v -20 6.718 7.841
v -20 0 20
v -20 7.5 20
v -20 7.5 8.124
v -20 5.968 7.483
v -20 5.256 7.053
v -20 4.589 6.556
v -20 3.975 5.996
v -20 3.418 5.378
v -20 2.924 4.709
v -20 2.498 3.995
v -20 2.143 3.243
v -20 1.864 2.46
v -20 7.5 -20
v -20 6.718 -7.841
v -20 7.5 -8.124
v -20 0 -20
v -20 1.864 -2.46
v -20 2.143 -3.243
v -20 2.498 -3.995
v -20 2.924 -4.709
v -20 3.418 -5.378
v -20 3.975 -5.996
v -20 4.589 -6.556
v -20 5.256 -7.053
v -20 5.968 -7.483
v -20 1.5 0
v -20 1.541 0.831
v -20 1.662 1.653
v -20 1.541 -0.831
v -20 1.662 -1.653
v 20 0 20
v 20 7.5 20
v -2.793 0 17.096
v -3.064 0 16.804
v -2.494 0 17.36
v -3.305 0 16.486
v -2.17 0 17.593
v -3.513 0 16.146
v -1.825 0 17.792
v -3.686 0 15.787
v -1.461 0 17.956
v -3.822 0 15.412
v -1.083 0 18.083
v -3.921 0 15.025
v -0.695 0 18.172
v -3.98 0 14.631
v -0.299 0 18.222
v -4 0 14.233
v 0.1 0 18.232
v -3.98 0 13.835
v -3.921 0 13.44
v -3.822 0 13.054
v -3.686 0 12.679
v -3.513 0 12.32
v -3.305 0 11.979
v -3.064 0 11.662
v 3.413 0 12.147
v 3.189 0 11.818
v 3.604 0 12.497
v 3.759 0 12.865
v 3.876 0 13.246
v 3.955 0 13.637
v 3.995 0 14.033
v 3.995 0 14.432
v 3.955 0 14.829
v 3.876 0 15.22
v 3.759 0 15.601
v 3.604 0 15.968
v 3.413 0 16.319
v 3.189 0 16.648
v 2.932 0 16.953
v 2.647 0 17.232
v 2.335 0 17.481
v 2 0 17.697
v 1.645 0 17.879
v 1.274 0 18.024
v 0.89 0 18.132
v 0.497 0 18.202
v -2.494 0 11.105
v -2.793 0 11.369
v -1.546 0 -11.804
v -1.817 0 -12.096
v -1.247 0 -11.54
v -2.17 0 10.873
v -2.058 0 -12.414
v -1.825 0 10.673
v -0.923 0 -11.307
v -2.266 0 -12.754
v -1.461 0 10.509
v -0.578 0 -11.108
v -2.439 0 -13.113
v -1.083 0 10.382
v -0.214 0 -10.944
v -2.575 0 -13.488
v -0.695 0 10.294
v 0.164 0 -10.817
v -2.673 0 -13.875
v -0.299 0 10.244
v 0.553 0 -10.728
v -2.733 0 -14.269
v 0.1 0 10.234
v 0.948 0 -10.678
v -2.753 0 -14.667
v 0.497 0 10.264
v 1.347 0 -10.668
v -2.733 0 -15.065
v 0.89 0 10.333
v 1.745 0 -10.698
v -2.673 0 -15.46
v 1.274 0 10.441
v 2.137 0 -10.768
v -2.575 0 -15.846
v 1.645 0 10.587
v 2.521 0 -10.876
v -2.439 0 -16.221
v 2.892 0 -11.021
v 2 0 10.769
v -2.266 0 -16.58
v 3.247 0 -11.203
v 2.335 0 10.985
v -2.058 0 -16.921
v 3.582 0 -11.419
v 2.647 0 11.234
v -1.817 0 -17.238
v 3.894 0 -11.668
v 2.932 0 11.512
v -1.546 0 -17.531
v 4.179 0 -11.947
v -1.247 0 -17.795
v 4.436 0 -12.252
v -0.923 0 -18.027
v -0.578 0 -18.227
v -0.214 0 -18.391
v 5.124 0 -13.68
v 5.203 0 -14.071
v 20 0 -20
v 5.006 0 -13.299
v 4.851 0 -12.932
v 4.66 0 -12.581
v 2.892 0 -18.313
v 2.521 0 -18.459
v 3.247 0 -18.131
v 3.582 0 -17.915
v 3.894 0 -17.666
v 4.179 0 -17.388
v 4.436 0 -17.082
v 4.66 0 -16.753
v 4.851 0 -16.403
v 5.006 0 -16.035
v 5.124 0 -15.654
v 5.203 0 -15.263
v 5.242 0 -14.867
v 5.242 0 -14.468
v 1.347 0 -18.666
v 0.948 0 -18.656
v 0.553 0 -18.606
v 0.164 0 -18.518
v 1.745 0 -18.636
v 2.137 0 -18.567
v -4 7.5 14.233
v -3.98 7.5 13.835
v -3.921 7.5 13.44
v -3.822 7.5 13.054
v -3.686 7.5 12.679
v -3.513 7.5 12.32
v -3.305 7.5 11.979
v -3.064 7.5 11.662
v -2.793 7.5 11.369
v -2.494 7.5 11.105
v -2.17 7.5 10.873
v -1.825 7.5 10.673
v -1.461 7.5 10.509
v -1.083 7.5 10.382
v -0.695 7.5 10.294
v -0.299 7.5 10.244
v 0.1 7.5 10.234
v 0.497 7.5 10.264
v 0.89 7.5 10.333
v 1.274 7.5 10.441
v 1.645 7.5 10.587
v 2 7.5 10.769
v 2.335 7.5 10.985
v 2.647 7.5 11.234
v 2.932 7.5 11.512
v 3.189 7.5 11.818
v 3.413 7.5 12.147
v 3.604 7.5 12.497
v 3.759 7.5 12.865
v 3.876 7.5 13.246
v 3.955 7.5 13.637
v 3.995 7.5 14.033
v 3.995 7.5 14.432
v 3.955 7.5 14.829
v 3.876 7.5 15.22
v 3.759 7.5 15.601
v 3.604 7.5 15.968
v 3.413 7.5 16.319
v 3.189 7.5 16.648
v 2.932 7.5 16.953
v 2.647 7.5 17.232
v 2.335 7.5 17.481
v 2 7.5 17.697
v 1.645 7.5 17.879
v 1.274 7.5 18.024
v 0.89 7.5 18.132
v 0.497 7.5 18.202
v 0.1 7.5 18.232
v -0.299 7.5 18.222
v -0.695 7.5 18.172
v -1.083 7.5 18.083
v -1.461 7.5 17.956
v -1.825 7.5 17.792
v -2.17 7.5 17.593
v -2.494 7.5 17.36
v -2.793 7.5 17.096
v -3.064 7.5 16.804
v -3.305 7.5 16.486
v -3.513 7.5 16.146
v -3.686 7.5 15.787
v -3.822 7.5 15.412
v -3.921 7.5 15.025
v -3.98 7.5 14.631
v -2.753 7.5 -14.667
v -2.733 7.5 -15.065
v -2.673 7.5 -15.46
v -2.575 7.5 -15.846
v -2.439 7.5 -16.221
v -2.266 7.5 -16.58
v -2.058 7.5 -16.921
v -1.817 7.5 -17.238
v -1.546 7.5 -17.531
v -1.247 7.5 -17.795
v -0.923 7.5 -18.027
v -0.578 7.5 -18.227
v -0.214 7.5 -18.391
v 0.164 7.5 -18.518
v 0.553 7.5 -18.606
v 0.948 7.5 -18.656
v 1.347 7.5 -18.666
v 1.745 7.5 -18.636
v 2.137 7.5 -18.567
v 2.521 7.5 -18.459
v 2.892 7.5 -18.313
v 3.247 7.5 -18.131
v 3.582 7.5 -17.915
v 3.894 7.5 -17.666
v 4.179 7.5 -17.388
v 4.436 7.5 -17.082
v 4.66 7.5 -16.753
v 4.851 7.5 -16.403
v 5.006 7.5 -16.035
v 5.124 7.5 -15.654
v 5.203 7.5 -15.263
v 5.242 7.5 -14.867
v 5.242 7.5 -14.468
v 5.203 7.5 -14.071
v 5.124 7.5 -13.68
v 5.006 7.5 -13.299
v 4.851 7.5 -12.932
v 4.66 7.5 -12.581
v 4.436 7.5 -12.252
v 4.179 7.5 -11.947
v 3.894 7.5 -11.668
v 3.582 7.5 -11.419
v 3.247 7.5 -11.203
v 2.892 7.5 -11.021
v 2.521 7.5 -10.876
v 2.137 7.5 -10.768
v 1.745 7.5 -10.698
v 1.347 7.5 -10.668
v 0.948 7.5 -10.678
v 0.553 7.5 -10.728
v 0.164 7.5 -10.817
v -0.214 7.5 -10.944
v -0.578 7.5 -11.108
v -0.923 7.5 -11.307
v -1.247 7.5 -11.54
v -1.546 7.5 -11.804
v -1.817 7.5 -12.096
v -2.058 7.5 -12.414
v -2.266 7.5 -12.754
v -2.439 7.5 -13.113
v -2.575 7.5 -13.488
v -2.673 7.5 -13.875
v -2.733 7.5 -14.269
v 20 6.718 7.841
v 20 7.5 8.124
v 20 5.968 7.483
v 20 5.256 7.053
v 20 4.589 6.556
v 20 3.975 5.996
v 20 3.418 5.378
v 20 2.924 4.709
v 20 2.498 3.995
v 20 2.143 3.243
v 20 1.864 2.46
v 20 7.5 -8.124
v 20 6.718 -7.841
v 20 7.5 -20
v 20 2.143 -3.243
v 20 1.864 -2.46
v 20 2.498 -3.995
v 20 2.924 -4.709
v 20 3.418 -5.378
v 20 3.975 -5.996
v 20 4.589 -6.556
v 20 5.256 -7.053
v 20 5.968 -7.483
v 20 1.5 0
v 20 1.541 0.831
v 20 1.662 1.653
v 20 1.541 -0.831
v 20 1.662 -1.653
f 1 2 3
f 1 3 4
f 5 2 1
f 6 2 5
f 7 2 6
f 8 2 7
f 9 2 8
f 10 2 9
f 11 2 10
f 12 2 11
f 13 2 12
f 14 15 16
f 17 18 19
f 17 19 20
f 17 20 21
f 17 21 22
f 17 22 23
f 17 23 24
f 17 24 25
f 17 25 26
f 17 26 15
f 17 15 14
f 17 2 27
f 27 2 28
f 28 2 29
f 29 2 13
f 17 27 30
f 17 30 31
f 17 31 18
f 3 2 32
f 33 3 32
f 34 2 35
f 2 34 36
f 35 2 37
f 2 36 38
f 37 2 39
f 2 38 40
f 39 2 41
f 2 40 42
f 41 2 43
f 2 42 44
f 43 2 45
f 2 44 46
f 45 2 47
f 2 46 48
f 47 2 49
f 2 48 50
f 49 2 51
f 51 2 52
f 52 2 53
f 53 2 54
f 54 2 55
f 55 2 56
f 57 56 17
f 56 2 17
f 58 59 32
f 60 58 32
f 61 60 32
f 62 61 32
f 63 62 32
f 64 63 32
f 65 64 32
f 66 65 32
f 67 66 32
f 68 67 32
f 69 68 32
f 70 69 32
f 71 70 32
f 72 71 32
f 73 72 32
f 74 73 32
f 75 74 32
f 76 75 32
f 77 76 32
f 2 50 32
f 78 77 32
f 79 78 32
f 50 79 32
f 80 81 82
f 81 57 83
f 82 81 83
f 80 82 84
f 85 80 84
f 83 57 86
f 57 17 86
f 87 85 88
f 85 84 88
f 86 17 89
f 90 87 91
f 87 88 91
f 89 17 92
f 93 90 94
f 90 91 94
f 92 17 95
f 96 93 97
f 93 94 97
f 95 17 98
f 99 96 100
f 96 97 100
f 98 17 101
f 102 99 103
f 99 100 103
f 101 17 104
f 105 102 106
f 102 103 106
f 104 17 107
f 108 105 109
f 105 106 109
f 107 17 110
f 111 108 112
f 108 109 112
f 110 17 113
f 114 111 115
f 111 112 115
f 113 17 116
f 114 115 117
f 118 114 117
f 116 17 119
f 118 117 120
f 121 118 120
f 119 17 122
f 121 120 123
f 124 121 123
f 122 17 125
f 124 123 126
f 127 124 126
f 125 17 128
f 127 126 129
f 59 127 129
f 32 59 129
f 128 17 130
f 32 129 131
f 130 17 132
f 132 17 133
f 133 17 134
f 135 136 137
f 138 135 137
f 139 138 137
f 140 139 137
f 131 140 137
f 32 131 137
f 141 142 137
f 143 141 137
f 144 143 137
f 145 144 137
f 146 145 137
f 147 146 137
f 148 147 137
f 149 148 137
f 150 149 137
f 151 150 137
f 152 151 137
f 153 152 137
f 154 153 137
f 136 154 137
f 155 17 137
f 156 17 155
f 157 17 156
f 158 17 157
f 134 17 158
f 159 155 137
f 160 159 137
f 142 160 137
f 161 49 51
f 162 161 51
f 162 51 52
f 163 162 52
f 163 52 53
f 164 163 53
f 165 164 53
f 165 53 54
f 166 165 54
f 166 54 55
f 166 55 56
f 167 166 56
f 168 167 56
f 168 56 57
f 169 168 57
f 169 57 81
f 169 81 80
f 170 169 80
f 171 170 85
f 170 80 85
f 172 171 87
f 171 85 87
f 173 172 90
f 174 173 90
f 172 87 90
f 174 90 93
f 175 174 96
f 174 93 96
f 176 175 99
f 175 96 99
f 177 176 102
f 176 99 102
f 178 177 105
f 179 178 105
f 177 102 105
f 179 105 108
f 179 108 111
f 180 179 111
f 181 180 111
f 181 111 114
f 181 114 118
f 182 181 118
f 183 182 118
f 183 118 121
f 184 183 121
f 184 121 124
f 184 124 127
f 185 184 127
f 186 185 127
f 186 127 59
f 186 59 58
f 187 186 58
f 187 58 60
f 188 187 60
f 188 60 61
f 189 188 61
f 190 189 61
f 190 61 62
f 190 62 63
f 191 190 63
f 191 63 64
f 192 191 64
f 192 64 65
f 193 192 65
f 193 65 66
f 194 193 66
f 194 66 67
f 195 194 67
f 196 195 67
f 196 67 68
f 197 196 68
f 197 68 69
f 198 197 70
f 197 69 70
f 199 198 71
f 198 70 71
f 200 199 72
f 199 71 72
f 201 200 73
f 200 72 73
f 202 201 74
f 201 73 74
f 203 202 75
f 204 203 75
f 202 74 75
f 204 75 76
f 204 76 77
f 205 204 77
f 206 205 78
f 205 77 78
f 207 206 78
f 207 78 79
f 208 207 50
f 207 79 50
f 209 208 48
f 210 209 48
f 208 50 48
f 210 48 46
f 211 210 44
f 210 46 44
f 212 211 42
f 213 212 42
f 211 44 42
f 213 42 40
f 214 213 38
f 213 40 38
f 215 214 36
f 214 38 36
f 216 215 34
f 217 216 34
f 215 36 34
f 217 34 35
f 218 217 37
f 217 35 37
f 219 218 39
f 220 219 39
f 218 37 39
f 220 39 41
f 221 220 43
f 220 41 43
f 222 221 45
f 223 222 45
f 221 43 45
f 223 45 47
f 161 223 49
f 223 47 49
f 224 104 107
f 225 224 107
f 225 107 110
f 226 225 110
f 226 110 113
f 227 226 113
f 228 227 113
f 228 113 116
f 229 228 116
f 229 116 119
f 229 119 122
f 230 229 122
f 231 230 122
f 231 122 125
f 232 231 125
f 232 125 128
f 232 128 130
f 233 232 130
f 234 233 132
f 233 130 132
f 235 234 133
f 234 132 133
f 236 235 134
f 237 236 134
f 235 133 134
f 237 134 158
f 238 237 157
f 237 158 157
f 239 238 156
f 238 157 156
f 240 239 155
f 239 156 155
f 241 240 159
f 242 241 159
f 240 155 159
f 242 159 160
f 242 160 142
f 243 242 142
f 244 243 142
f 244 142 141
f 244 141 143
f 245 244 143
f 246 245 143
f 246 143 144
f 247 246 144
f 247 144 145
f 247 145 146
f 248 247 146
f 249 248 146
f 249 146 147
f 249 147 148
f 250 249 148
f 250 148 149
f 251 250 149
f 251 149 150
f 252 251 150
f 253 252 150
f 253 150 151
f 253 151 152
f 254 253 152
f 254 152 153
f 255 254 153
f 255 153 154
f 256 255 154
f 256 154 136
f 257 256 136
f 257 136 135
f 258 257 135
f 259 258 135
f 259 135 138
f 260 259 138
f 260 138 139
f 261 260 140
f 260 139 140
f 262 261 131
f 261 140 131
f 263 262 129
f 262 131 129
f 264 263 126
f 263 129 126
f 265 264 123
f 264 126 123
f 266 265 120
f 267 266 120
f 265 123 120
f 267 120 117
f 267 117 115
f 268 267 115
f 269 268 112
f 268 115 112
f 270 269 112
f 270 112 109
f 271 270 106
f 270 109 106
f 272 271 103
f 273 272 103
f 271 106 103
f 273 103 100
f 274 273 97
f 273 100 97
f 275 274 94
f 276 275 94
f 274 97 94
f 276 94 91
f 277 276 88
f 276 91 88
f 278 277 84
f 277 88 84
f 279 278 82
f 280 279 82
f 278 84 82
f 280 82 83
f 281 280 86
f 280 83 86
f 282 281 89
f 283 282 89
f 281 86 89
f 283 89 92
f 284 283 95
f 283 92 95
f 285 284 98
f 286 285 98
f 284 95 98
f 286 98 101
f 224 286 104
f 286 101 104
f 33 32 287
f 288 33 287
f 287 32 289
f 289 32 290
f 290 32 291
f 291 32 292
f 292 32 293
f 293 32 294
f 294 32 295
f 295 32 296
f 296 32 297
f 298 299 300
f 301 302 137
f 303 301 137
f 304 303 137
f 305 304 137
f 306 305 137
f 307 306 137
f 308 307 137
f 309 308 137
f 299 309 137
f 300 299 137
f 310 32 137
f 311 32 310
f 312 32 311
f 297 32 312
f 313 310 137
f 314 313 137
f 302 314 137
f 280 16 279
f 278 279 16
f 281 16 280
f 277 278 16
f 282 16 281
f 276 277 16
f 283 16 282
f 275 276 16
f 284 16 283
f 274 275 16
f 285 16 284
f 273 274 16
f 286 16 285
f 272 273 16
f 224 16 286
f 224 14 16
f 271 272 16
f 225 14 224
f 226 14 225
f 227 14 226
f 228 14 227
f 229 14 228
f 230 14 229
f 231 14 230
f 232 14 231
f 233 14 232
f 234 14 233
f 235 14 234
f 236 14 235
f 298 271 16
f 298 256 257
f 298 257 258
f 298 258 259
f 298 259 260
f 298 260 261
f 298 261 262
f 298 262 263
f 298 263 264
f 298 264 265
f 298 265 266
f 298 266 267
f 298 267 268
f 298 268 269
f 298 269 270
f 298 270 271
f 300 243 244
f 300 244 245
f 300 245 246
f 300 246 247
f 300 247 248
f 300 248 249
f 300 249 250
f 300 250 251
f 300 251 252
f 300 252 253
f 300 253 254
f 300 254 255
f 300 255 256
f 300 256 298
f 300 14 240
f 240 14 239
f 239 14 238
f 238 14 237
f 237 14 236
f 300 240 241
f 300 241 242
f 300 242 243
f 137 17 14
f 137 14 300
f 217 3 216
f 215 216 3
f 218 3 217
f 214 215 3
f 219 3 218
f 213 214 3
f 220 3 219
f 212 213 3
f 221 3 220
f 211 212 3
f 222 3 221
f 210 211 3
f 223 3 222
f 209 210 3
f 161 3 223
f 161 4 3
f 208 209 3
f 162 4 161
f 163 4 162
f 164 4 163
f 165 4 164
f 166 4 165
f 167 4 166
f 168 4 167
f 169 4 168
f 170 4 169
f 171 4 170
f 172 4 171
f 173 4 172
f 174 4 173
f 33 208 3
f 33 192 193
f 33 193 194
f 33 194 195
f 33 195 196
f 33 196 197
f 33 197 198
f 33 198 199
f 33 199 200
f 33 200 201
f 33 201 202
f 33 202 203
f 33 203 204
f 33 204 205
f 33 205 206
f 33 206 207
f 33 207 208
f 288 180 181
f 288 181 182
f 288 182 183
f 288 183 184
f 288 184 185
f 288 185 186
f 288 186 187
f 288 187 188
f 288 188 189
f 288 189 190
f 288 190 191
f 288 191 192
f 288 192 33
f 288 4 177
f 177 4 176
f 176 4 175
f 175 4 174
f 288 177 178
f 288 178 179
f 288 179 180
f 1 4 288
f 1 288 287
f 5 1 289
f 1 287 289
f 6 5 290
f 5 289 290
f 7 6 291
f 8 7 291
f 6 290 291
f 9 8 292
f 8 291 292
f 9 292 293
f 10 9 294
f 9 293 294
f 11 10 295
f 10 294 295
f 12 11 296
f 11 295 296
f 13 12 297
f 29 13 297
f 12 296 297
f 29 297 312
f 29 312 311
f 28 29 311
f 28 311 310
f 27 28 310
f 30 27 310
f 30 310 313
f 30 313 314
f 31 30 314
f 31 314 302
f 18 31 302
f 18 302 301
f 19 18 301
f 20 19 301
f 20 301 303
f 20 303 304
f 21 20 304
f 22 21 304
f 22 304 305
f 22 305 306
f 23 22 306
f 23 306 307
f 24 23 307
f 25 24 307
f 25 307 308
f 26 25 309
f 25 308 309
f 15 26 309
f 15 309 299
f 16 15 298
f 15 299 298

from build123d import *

# Parameters (mm, degrees)
SKETCH1_W                = 40
SKETCH1_H                = 40
BOSS_EXTRUDE1_DEPTH      = 7.5
CUT_EXTRUDE1_DEPTH       = 20
CUT_EXTRUDE1_DEPTH_BACK  = 20
SKETCH2_R                = 8.5
F_8_0_8_DIAMETER_HOLE1_D = 8


with BuildPart() as part:
    # Sketch1 → Boss-Extrude1 (new body)
    with BuildSketch(Plane(origin=(0, 0, 0), x_dir=(1, 0, 0), z_dir=(0, 1, 0))):
        Rectangle(SKETCH1_W, SKETCH1_H)
    extrude(amount=BOSS_EXTRUDE1_DEPTH)

    # Sketch2 → Cut-Extrude1 (cut, two sides: drawn at the far end of the back side and taken through both)
    with BuildSketch(Plane(origin=(0, 0, 0), x_dir=(0, 0, -1), z_dir=(1, 0, 0)).offset(-CUT_EXTRUDE1_DEPTH_BACK)):
        with Locations((0, 10)):
            Circle(SKETCH2_R)
    extrude(amount=CUT_EXTRUDE1_DEPTH + CUT_EXTRUDE1_DEPTH_BACK, mode=Mode.SUBTRACT)

    # Ø8.0 (8) Diameter Hole1 (through all)
    with Locations(Plane(origin=(0, 7.5, 0), x_dir=(1, 0, 0), z_dir=(0, 1, 0))):
        with Locations((1.247226864, 14.667228454), (0, -14.232771546)):
            Hole(F_8_0_8_DIAMETER_HOLE1_D / 2)


solid = part.part
